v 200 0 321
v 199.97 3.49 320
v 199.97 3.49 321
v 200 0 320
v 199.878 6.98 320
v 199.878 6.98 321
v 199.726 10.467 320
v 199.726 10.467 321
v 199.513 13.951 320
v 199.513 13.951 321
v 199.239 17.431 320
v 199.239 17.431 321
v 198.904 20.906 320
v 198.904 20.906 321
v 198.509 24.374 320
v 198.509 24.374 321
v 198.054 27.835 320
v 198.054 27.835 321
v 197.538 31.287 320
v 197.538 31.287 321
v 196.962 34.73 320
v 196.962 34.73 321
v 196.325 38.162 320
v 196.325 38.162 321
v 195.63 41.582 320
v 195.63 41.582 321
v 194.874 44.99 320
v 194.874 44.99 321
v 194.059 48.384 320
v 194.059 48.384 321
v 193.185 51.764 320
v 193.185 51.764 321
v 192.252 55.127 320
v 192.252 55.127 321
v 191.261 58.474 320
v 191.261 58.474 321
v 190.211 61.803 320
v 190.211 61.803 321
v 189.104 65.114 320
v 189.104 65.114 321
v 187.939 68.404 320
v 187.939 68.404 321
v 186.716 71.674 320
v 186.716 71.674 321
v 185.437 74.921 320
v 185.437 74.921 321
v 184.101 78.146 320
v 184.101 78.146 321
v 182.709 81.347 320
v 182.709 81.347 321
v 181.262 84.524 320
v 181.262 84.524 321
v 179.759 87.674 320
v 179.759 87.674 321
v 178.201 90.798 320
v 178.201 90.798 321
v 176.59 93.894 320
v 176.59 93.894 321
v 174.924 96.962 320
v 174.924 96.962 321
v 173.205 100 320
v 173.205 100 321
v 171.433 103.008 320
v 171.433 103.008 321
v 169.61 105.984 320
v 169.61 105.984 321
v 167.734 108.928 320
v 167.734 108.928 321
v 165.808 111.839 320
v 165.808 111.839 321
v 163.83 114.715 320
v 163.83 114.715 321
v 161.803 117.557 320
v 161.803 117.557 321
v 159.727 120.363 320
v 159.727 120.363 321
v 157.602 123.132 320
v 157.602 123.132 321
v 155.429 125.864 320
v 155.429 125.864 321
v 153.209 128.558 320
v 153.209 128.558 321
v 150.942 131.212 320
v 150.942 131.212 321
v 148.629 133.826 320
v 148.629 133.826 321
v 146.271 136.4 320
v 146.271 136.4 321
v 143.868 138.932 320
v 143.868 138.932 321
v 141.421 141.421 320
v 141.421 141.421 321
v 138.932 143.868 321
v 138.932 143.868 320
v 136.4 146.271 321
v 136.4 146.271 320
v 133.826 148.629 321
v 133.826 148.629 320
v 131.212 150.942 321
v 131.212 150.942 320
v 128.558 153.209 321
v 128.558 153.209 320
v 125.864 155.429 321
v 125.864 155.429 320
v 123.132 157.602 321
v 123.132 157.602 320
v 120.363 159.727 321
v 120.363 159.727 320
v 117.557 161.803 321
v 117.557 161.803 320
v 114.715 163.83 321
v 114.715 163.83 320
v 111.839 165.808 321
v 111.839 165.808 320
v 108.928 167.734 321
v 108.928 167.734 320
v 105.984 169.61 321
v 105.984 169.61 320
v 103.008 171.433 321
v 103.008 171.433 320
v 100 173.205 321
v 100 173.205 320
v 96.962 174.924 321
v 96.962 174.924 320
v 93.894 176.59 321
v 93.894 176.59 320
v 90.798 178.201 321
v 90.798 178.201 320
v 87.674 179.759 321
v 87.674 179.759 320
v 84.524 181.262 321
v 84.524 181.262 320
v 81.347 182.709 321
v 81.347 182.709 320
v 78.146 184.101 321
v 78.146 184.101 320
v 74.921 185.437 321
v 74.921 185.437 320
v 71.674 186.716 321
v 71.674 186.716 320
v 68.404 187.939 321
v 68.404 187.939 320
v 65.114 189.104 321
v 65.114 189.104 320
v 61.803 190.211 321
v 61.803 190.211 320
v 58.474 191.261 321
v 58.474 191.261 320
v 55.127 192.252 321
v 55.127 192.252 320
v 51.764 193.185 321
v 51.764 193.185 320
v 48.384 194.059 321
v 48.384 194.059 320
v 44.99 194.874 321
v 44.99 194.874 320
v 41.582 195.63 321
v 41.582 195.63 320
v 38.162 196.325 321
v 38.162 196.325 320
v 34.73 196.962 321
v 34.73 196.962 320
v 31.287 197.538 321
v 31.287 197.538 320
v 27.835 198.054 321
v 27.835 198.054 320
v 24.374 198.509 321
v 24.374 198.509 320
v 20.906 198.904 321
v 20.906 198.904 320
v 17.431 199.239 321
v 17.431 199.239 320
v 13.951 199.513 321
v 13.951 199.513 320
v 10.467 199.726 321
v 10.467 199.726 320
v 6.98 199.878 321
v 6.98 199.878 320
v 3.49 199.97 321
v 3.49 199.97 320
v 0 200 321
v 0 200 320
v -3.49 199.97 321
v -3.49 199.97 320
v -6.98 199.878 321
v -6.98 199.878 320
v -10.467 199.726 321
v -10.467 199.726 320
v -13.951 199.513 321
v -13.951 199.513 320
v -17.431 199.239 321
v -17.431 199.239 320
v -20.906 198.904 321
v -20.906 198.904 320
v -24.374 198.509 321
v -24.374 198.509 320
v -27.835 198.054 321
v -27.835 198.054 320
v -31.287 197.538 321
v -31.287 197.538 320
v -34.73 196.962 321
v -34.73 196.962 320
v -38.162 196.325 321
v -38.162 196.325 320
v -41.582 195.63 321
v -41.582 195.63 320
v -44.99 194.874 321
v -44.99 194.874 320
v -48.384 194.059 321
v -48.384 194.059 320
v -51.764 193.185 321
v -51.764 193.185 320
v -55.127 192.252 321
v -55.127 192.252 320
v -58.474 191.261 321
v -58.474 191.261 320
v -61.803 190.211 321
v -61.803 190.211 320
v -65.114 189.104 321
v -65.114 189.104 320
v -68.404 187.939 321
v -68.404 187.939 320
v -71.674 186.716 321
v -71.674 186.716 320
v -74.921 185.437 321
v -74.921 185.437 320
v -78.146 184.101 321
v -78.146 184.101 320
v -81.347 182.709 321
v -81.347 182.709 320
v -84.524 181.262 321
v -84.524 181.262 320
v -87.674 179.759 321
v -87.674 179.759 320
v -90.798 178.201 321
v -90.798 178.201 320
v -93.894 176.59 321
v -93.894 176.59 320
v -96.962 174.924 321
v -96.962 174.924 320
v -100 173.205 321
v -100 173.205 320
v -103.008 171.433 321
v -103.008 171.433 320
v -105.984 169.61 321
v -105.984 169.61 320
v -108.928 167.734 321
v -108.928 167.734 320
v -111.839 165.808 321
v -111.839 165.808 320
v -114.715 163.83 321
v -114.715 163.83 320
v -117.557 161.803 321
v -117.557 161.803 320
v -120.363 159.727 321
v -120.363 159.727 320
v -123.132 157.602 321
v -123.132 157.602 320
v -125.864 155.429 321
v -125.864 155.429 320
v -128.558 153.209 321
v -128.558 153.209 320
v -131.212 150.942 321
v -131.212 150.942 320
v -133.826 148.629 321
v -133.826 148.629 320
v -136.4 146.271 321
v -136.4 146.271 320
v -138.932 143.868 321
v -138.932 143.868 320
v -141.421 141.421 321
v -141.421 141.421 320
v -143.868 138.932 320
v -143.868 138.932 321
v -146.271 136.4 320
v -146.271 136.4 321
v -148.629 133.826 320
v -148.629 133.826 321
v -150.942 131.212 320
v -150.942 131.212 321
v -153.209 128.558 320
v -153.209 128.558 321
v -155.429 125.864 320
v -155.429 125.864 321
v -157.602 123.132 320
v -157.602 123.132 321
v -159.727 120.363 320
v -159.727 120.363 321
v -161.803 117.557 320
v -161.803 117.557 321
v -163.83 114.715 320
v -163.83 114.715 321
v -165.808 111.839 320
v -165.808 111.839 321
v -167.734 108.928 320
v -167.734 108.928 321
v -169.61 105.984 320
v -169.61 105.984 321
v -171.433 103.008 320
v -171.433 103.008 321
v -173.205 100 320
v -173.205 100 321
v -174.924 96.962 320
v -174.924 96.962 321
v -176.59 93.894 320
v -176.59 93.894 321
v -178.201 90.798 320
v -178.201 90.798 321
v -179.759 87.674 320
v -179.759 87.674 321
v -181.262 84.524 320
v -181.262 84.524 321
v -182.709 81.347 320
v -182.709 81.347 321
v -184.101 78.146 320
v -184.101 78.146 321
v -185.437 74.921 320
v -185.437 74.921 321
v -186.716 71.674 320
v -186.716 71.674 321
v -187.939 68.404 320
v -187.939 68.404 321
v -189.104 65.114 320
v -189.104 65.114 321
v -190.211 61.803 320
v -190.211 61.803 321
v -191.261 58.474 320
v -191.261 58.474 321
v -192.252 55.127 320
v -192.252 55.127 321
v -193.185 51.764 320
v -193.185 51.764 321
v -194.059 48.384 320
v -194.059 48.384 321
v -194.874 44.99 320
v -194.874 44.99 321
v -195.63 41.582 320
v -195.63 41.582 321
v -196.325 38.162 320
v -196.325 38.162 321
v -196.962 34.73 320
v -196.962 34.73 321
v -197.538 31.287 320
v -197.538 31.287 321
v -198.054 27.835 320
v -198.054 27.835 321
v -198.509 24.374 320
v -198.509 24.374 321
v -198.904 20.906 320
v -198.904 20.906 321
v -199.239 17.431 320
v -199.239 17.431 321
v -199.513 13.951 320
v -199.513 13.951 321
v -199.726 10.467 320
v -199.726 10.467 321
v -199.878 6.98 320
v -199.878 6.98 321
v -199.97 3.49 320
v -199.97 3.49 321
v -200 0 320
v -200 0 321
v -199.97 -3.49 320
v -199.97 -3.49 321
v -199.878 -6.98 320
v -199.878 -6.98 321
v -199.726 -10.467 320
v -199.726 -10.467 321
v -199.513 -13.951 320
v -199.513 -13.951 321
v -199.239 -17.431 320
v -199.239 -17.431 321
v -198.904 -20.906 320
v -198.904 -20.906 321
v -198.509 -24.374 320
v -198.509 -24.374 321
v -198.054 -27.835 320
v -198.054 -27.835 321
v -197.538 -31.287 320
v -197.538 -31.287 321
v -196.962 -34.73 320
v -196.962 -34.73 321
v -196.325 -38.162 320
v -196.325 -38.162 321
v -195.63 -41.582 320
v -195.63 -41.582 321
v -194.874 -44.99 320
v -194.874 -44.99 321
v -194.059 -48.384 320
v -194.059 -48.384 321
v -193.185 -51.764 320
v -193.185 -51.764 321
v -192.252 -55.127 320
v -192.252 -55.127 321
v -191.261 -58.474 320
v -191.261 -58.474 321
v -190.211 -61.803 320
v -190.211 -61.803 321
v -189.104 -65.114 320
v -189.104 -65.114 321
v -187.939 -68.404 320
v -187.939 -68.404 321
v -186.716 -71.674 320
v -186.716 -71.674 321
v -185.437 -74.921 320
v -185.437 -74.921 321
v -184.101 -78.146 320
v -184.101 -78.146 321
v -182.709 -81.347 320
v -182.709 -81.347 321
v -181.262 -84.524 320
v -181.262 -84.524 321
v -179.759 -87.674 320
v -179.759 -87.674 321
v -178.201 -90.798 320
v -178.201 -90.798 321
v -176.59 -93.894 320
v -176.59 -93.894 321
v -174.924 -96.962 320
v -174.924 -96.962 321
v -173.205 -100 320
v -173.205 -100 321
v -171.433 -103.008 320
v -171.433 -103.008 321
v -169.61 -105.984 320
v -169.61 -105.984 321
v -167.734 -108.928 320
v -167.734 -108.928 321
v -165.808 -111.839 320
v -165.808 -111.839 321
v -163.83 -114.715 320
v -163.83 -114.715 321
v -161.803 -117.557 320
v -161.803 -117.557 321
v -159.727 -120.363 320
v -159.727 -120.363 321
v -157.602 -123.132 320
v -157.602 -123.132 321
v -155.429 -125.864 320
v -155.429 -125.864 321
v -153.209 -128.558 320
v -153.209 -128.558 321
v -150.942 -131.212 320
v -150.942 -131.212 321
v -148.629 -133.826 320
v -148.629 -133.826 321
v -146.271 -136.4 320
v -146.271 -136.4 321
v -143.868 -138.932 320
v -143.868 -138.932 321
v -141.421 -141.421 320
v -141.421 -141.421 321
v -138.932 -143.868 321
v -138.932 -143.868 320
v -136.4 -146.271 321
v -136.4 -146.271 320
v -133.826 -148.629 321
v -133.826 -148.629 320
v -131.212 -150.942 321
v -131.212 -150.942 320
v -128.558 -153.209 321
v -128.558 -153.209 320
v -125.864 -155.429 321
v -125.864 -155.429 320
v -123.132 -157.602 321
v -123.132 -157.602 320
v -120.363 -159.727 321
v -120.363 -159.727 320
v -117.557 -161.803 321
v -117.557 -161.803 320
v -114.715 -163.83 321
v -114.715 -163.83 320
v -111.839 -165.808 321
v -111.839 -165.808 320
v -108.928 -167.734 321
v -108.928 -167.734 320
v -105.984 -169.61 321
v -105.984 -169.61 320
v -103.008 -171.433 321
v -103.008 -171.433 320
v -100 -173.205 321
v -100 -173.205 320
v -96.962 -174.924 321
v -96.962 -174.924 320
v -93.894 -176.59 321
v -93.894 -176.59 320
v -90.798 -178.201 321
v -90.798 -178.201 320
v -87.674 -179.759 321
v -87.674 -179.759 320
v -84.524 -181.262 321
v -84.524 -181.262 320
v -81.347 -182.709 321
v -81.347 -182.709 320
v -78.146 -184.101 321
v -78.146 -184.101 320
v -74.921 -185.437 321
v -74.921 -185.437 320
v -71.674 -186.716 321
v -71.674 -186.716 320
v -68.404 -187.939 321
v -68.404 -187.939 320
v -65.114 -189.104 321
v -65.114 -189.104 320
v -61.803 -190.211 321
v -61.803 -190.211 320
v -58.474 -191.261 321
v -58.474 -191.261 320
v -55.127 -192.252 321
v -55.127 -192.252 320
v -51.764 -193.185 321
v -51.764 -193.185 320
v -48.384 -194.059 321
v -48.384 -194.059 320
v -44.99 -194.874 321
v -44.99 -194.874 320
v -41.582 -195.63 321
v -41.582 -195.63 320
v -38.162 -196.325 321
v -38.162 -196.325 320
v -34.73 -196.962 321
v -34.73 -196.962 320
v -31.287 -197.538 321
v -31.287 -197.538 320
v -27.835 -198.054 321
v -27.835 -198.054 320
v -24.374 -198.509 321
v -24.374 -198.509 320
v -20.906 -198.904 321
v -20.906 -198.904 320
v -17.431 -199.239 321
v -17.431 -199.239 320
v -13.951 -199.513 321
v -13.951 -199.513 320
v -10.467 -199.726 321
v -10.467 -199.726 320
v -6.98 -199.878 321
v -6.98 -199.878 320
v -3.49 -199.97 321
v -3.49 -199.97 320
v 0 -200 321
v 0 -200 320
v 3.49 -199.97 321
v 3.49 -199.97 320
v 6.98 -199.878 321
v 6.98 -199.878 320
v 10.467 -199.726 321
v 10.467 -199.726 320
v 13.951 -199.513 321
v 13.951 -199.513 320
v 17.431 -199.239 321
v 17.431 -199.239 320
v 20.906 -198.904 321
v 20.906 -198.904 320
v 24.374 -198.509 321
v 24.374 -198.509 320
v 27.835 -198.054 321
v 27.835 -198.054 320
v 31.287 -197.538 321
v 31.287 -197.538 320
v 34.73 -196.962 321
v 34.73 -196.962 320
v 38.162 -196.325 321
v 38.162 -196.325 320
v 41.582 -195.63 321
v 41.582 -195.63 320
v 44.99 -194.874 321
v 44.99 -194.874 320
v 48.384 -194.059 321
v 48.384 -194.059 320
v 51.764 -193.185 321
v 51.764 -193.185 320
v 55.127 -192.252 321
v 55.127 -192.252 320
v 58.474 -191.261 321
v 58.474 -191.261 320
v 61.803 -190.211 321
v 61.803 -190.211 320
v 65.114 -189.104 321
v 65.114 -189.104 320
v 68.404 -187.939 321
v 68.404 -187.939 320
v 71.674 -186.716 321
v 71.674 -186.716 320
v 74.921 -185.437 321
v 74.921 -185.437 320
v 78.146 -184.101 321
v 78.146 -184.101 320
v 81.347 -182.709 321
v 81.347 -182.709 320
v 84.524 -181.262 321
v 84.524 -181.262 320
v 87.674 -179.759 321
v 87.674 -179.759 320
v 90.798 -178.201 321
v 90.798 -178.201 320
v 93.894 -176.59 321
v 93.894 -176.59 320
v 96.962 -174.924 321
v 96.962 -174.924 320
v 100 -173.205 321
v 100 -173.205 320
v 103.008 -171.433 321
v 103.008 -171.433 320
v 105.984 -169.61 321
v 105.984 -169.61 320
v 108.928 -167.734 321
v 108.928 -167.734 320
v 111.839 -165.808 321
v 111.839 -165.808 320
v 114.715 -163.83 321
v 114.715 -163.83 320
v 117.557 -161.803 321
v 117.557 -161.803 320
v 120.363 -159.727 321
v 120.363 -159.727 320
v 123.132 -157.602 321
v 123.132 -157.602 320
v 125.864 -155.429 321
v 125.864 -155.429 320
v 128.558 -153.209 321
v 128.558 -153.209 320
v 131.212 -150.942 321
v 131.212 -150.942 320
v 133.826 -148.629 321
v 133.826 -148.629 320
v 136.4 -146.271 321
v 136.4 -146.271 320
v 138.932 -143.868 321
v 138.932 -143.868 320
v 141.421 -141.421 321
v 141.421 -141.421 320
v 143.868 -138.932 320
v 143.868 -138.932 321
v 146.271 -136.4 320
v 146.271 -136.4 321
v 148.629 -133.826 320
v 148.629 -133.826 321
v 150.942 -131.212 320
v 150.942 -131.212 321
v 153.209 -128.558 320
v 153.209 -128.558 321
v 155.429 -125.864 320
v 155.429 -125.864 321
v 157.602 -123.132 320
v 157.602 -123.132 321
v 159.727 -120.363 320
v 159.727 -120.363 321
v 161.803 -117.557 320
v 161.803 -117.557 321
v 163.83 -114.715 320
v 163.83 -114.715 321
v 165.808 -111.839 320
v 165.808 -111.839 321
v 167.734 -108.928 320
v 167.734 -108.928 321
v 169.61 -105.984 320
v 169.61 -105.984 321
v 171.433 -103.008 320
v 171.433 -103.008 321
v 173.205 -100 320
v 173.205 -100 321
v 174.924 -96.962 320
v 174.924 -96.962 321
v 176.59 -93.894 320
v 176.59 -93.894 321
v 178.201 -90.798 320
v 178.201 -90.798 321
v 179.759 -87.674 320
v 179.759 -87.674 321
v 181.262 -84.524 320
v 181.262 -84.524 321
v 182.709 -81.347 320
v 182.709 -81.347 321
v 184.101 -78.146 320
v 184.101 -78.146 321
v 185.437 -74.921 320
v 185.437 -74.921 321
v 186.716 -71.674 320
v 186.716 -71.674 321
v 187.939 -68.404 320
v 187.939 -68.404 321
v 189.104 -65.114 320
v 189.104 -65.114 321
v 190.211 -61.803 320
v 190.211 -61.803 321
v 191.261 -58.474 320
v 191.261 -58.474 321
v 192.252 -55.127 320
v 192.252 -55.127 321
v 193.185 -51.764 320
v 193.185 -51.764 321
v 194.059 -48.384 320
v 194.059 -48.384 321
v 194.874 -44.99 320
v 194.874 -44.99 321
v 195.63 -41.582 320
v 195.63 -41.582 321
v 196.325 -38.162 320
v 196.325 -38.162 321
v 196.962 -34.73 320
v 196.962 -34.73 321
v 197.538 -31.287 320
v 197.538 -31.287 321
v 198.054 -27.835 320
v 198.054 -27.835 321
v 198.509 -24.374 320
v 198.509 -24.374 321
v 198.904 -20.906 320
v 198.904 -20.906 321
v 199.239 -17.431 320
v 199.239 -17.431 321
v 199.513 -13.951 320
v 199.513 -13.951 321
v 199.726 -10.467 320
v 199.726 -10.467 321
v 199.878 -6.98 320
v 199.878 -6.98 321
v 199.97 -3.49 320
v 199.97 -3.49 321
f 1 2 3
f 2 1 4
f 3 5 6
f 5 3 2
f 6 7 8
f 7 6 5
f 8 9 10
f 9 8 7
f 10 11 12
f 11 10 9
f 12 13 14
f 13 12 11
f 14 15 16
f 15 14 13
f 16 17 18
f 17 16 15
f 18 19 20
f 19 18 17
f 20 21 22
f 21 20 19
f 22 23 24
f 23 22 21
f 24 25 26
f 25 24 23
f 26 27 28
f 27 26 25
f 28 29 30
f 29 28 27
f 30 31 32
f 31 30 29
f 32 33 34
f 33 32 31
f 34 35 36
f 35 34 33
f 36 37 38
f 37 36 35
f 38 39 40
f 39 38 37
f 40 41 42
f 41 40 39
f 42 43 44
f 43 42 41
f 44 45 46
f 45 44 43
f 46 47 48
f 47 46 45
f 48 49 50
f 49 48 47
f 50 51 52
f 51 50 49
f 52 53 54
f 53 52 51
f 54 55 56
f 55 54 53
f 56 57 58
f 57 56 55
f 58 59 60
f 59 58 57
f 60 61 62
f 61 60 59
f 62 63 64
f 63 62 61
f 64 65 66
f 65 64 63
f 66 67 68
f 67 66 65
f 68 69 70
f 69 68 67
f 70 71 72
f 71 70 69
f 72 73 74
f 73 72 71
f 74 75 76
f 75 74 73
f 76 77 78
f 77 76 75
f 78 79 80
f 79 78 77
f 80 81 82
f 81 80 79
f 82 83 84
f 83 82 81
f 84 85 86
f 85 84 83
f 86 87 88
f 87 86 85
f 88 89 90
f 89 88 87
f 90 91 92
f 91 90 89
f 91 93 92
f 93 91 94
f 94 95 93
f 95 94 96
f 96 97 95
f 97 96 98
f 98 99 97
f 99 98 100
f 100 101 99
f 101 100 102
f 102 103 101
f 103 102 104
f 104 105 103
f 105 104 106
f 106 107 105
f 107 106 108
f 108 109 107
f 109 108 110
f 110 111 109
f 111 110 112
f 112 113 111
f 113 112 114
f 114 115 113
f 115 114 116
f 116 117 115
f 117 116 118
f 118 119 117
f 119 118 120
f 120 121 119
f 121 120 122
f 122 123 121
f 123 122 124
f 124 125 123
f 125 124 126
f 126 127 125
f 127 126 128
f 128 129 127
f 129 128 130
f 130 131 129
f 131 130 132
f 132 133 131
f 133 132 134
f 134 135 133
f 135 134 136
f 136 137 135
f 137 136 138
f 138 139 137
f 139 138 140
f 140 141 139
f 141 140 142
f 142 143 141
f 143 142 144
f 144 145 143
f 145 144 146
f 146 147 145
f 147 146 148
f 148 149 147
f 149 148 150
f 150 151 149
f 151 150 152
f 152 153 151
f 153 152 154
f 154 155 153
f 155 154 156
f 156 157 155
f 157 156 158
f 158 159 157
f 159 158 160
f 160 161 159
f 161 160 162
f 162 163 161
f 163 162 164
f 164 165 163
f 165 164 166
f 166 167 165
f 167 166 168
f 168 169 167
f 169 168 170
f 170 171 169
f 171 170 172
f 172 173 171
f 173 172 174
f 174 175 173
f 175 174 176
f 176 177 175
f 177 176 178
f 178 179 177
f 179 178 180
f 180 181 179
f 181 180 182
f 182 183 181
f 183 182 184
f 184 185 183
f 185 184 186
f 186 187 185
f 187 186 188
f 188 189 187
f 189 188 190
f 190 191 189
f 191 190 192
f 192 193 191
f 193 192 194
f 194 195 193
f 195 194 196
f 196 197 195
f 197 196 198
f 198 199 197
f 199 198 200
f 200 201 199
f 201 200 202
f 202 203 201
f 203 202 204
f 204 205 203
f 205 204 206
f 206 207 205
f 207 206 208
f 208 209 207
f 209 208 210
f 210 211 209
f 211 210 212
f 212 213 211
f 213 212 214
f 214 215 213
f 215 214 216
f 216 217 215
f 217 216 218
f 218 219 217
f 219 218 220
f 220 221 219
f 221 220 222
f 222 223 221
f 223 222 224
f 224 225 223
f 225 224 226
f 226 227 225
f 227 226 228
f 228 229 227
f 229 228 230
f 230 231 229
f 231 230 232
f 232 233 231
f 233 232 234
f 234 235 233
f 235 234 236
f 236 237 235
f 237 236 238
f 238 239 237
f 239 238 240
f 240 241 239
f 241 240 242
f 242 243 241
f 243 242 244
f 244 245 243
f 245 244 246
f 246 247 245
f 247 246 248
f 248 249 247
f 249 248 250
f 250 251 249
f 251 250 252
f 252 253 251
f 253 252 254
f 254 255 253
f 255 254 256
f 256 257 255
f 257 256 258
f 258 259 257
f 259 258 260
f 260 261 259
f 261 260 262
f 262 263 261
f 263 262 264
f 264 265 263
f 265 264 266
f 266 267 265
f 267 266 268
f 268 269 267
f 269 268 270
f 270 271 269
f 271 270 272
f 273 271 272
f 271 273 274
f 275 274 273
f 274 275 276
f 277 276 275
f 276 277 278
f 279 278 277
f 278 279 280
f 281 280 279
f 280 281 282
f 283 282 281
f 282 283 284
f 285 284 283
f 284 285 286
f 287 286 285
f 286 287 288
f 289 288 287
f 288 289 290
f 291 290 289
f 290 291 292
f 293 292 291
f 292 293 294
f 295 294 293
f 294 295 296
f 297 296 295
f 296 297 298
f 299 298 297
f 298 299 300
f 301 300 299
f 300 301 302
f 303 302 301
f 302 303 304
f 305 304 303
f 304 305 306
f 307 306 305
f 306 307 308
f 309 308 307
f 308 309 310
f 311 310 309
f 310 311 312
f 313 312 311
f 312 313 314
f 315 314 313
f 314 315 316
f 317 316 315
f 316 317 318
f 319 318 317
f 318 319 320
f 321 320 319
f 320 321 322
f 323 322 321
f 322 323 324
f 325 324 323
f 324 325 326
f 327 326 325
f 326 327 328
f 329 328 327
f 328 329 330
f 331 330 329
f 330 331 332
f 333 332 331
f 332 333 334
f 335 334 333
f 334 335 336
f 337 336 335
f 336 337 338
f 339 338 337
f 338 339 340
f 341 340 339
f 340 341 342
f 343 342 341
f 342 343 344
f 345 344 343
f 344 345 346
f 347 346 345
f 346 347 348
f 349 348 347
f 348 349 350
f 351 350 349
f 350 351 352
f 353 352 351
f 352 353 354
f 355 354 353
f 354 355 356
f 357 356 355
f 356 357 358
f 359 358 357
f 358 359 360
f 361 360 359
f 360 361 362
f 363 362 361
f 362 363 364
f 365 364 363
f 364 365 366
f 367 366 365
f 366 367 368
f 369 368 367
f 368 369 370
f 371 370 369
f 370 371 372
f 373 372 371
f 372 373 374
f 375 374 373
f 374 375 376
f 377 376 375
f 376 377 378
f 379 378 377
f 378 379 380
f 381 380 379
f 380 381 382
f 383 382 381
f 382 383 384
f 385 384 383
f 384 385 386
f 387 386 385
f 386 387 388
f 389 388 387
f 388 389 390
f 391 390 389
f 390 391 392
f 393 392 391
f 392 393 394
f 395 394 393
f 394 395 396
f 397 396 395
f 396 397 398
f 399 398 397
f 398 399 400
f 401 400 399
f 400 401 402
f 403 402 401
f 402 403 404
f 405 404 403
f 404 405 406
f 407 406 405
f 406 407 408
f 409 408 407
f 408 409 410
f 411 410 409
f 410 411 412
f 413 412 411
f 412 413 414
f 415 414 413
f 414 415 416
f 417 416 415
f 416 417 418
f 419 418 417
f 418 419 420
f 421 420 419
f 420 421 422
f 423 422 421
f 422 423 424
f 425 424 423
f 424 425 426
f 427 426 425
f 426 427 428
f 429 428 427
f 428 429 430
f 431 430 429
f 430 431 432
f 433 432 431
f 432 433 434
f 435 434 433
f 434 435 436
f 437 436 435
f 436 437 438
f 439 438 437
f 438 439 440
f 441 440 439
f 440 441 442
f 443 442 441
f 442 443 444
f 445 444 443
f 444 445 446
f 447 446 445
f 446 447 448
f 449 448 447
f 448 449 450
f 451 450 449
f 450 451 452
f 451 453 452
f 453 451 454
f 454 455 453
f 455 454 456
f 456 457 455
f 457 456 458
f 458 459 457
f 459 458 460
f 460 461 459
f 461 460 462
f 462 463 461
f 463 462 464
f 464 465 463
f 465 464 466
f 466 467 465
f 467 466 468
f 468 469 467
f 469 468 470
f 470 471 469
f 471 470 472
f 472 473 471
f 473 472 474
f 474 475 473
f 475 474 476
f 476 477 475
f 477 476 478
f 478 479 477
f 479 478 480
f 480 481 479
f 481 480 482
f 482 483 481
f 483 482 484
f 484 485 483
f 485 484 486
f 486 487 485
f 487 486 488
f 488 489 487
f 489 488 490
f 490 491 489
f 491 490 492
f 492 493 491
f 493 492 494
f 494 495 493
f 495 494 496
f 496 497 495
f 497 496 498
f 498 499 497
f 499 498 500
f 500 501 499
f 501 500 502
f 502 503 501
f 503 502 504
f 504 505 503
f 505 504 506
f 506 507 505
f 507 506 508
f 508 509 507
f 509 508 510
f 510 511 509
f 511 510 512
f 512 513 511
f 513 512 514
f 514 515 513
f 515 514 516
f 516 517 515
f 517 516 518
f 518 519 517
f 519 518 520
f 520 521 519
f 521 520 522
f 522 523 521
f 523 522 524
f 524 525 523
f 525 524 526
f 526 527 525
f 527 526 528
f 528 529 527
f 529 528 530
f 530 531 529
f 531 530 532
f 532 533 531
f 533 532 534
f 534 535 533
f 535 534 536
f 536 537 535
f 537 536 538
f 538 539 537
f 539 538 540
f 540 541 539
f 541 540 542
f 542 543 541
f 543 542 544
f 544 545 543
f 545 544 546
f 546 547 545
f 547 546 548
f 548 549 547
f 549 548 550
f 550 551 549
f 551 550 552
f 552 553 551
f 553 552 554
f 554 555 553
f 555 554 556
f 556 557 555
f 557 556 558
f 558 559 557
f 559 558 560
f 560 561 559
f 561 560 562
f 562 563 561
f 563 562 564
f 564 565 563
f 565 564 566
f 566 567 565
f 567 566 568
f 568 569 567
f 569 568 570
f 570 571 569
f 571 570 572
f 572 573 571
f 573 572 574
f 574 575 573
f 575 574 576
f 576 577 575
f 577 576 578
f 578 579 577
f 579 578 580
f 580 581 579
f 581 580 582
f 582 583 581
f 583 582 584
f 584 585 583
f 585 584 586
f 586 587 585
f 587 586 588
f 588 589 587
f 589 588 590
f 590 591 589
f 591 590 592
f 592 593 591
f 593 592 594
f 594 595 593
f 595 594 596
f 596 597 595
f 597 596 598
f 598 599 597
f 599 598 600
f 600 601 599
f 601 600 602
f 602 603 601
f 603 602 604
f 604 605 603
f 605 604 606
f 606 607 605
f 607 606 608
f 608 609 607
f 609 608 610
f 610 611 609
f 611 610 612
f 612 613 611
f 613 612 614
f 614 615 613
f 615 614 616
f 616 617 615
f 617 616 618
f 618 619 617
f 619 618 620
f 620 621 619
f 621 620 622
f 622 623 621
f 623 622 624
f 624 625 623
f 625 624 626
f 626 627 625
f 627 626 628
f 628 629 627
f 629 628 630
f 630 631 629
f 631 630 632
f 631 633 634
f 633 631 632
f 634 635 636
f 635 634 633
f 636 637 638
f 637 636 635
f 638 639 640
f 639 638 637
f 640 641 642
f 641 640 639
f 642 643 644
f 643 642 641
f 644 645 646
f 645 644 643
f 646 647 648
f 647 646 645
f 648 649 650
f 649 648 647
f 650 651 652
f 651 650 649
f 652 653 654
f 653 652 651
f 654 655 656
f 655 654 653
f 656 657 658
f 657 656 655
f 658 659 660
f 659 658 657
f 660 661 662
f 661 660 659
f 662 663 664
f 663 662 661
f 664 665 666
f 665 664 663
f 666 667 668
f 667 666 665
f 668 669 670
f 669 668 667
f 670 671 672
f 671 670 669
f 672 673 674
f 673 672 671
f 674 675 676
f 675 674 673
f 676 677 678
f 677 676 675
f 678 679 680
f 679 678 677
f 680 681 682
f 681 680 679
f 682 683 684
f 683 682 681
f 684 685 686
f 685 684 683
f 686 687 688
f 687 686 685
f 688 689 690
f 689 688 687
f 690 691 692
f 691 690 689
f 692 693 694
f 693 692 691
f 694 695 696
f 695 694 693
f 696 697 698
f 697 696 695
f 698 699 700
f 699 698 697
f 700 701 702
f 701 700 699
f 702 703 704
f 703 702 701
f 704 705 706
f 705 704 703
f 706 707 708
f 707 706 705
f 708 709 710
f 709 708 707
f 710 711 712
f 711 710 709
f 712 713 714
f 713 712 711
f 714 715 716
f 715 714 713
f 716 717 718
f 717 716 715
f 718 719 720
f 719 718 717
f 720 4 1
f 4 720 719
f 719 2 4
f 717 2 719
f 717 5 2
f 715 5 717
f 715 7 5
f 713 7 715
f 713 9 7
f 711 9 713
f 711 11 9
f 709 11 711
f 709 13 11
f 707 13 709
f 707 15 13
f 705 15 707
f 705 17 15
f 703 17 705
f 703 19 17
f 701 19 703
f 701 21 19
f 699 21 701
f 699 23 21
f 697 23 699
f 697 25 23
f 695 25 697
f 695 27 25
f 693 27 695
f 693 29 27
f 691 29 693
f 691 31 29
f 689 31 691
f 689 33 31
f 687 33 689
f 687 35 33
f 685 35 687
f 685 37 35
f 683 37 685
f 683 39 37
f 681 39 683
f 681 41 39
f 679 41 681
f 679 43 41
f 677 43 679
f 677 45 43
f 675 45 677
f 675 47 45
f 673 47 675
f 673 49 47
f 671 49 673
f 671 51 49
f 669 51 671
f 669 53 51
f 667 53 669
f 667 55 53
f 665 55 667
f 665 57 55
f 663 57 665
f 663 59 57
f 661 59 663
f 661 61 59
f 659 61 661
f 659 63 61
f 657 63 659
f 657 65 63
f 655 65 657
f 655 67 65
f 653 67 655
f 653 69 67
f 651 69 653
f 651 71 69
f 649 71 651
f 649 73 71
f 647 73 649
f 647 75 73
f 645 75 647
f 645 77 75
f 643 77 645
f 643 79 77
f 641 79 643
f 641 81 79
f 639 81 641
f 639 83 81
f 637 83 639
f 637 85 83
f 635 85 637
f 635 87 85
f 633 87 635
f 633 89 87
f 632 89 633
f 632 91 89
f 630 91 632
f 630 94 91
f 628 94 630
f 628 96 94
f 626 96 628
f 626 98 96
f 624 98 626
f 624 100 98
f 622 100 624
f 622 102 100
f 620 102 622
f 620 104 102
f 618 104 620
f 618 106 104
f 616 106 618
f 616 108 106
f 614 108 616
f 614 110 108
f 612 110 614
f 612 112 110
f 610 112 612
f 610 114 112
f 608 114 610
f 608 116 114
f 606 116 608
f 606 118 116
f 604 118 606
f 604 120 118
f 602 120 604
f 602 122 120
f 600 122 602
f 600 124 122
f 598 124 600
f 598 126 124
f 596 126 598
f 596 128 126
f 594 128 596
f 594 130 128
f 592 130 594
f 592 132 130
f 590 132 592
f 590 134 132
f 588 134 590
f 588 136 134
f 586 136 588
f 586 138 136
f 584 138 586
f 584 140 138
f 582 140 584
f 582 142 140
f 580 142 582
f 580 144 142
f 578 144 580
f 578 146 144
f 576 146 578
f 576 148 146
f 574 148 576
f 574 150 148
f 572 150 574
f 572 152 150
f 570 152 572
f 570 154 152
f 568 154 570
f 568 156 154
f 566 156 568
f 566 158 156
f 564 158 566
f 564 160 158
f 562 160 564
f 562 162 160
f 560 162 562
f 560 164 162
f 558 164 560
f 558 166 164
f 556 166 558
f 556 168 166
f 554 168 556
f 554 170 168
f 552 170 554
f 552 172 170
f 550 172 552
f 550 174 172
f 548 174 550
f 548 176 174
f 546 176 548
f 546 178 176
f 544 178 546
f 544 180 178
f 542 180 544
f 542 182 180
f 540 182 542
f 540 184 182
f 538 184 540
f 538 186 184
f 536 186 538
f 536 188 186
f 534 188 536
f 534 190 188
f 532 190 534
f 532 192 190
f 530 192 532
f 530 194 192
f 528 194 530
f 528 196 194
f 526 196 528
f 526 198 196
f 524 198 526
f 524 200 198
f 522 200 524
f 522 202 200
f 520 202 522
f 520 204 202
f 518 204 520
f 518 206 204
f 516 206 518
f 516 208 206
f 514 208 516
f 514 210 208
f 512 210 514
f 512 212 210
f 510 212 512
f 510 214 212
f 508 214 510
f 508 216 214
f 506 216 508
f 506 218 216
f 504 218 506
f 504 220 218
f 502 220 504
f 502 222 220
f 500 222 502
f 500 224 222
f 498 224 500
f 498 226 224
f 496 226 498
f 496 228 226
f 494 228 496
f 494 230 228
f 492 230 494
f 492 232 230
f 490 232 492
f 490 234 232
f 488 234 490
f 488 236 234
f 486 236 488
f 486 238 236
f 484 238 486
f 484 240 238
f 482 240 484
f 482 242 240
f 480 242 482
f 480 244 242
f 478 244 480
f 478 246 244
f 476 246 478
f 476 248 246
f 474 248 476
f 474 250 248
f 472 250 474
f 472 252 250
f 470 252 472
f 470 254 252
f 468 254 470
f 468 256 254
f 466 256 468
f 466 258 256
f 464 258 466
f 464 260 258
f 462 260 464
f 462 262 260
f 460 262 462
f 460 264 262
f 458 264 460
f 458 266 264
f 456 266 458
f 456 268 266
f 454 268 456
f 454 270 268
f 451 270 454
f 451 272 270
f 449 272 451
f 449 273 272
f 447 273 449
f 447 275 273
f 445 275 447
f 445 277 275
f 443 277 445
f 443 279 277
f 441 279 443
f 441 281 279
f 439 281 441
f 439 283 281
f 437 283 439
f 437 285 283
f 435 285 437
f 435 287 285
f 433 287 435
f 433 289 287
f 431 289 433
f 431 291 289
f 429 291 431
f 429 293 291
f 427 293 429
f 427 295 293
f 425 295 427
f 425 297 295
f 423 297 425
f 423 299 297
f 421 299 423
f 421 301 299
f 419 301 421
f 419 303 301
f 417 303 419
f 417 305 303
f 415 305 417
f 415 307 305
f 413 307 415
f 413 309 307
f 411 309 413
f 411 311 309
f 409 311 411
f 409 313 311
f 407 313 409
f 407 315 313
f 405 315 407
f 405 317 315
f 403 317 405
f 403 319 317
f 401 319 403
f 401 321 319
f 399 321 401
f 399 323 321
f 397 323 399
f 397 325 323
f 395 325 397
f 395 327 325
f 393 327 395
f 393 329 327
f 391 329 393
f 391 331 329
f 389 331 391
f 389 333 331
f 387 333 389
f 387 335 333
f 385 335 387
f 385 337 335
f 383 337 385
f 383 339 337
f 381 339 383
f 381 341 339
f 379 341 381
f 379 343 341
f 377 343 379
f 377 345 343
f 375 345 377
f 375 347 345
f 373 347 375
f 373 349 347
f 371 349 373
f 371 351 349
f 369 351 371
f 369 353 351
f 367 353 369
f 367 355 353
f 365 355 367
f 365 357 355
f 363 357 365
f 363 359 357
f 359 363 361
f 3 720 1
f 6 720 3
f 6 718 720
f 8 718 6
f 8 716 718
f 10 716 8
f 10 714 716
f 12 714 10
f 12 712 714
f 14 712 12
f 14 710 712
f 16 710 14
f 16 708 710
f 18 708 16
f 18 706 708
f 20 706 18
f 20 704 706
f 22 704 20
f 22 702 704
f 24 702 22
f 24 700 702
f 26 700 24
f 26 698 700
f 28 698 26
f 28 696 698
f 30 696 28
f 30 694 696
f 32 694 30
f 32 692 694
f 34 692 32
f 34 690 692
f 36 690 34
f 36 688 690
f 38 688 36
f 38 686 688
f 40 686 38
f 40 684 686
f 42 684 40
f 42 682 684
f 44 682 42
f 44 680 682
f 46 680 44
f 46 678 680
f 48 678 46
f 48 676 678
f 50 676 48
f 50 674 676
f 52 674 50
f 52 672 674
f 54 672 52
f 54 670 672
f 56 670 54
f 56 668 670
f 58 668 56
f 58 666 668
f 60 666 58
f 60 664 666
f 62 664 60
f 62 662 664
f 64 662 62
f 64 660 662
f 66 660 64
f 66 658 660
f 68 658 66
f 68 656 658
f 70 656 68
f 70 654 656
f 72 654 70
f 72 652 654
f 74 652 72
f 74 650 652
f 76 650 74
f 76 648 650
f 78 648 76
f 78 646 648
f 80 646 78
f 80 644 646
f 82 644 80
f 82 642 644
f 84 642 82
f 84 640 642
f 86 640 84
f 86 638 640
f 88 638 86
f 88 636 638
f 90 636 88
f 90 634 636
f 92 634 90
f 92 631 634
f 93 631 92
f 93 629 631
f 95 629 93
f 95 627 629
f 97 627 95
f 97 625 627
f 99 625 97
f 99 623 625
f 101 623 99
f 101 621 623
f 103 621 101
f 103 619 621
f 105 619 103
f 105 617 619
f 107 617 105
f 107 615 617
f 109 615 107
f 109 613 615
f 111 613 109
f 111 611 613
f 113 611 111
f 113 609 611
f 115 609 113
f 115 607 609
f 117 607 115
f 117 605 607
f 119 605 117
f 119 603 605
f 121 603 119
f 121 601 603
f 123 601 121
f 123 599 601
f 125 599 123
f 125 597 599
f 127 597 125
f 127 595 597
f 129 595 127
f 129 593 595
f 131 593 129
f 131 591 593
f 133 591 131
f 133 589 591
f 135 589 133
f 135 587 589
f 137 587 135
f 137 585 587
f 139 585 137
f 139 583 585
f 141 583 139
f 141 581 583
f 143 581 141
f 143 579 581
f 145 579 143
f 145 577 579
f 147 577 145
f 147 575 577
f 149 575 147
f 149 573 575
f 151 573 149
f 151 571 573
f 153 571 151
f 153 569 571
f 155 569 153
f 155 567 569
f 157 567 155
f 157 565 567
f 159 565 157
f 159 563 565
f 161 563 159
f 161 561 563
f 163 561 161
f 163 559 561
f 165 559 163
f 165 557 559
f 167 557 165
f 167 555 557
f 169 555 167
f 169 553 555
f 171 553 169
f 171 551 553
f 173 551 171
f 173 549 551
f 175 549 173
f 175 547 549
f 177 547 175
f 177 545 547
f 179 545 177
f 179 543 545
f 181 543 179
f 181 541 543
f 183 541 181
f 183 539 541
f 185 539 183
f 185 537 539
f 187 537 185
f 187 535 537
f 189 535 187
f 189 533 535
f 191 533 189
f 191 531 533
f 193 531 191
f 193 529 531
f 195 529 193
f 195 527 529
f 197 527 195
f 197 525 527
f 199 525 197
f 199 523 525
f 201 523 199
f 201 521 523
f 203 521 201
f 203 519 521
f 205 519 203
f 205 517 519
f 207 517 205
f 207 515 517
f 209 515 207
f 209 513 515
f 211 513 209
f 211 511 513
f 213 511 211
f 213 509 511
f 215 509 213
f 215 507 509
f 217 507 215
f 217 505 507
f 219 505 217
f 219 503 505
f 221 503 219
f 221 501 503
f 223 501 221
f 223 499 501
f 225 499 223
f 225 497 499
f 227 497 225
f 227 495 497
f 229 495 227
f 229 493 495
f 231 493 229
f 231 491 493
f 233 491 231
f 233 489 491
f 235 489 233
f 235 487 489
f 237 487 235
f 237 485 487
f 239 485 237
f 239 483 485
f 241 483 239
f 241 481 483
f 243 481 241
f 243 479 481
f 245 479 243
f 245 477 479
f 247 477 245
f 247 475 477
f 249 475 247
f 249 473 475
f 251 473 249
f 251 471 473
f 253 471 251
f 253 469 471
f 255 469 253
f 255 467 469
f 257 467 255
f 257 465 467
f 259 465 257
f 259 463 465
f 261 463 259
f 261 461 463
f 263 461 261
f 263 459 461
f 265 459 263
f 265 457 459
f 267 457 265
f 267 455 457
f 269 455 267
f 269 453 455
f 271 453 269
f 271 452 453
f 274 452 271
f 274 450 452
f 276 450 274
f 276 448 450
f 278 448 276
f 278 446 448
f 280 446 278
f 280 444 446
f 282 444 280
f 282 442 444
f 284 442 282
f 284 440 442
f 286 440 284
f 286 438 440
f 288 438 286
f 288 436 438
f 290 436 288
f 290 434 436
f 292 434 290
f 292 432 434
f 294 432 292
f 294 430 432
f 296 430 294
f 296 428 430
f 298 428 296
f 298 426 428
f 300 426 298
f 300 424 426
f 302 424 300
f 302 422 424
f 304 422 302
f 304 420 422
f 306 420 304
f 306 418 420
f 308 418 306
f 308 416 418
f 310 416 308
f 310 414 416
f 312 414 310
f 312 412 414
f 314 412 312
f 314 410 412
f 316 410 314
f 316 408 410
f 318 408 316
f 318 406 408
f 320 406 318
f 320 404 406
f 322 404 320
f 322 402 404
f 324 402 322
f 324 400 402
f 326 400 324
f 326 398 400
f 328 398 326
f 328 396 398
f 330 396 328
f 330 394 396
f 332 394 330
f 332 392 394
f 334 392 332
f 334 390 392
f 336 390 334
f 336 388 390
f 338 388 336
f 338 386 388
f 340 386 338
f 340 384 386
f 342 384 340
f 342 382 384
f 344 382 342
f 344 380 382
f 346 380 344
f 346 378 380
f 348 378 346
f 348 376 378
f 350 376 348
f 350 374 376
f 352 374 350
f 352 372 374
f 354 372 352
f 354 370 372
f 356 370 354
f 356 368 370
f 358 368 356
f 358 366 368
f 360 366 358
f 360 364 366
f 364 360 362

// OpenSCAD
/*
    Stirred-Tank Simulation
    Copyright (c) 2021 FelixFebrian

    File fluidSurface.scad
*/

// User Settings
$fa = 1;

tankDiameter = 400;
fluidHeight = 320;


module fluid_surface() {
    translate([0, 0, fluidHeight])
        cylinder(d=tankDiameter, h=1);  // output has to be 3D object!
}

fluid_surface();
